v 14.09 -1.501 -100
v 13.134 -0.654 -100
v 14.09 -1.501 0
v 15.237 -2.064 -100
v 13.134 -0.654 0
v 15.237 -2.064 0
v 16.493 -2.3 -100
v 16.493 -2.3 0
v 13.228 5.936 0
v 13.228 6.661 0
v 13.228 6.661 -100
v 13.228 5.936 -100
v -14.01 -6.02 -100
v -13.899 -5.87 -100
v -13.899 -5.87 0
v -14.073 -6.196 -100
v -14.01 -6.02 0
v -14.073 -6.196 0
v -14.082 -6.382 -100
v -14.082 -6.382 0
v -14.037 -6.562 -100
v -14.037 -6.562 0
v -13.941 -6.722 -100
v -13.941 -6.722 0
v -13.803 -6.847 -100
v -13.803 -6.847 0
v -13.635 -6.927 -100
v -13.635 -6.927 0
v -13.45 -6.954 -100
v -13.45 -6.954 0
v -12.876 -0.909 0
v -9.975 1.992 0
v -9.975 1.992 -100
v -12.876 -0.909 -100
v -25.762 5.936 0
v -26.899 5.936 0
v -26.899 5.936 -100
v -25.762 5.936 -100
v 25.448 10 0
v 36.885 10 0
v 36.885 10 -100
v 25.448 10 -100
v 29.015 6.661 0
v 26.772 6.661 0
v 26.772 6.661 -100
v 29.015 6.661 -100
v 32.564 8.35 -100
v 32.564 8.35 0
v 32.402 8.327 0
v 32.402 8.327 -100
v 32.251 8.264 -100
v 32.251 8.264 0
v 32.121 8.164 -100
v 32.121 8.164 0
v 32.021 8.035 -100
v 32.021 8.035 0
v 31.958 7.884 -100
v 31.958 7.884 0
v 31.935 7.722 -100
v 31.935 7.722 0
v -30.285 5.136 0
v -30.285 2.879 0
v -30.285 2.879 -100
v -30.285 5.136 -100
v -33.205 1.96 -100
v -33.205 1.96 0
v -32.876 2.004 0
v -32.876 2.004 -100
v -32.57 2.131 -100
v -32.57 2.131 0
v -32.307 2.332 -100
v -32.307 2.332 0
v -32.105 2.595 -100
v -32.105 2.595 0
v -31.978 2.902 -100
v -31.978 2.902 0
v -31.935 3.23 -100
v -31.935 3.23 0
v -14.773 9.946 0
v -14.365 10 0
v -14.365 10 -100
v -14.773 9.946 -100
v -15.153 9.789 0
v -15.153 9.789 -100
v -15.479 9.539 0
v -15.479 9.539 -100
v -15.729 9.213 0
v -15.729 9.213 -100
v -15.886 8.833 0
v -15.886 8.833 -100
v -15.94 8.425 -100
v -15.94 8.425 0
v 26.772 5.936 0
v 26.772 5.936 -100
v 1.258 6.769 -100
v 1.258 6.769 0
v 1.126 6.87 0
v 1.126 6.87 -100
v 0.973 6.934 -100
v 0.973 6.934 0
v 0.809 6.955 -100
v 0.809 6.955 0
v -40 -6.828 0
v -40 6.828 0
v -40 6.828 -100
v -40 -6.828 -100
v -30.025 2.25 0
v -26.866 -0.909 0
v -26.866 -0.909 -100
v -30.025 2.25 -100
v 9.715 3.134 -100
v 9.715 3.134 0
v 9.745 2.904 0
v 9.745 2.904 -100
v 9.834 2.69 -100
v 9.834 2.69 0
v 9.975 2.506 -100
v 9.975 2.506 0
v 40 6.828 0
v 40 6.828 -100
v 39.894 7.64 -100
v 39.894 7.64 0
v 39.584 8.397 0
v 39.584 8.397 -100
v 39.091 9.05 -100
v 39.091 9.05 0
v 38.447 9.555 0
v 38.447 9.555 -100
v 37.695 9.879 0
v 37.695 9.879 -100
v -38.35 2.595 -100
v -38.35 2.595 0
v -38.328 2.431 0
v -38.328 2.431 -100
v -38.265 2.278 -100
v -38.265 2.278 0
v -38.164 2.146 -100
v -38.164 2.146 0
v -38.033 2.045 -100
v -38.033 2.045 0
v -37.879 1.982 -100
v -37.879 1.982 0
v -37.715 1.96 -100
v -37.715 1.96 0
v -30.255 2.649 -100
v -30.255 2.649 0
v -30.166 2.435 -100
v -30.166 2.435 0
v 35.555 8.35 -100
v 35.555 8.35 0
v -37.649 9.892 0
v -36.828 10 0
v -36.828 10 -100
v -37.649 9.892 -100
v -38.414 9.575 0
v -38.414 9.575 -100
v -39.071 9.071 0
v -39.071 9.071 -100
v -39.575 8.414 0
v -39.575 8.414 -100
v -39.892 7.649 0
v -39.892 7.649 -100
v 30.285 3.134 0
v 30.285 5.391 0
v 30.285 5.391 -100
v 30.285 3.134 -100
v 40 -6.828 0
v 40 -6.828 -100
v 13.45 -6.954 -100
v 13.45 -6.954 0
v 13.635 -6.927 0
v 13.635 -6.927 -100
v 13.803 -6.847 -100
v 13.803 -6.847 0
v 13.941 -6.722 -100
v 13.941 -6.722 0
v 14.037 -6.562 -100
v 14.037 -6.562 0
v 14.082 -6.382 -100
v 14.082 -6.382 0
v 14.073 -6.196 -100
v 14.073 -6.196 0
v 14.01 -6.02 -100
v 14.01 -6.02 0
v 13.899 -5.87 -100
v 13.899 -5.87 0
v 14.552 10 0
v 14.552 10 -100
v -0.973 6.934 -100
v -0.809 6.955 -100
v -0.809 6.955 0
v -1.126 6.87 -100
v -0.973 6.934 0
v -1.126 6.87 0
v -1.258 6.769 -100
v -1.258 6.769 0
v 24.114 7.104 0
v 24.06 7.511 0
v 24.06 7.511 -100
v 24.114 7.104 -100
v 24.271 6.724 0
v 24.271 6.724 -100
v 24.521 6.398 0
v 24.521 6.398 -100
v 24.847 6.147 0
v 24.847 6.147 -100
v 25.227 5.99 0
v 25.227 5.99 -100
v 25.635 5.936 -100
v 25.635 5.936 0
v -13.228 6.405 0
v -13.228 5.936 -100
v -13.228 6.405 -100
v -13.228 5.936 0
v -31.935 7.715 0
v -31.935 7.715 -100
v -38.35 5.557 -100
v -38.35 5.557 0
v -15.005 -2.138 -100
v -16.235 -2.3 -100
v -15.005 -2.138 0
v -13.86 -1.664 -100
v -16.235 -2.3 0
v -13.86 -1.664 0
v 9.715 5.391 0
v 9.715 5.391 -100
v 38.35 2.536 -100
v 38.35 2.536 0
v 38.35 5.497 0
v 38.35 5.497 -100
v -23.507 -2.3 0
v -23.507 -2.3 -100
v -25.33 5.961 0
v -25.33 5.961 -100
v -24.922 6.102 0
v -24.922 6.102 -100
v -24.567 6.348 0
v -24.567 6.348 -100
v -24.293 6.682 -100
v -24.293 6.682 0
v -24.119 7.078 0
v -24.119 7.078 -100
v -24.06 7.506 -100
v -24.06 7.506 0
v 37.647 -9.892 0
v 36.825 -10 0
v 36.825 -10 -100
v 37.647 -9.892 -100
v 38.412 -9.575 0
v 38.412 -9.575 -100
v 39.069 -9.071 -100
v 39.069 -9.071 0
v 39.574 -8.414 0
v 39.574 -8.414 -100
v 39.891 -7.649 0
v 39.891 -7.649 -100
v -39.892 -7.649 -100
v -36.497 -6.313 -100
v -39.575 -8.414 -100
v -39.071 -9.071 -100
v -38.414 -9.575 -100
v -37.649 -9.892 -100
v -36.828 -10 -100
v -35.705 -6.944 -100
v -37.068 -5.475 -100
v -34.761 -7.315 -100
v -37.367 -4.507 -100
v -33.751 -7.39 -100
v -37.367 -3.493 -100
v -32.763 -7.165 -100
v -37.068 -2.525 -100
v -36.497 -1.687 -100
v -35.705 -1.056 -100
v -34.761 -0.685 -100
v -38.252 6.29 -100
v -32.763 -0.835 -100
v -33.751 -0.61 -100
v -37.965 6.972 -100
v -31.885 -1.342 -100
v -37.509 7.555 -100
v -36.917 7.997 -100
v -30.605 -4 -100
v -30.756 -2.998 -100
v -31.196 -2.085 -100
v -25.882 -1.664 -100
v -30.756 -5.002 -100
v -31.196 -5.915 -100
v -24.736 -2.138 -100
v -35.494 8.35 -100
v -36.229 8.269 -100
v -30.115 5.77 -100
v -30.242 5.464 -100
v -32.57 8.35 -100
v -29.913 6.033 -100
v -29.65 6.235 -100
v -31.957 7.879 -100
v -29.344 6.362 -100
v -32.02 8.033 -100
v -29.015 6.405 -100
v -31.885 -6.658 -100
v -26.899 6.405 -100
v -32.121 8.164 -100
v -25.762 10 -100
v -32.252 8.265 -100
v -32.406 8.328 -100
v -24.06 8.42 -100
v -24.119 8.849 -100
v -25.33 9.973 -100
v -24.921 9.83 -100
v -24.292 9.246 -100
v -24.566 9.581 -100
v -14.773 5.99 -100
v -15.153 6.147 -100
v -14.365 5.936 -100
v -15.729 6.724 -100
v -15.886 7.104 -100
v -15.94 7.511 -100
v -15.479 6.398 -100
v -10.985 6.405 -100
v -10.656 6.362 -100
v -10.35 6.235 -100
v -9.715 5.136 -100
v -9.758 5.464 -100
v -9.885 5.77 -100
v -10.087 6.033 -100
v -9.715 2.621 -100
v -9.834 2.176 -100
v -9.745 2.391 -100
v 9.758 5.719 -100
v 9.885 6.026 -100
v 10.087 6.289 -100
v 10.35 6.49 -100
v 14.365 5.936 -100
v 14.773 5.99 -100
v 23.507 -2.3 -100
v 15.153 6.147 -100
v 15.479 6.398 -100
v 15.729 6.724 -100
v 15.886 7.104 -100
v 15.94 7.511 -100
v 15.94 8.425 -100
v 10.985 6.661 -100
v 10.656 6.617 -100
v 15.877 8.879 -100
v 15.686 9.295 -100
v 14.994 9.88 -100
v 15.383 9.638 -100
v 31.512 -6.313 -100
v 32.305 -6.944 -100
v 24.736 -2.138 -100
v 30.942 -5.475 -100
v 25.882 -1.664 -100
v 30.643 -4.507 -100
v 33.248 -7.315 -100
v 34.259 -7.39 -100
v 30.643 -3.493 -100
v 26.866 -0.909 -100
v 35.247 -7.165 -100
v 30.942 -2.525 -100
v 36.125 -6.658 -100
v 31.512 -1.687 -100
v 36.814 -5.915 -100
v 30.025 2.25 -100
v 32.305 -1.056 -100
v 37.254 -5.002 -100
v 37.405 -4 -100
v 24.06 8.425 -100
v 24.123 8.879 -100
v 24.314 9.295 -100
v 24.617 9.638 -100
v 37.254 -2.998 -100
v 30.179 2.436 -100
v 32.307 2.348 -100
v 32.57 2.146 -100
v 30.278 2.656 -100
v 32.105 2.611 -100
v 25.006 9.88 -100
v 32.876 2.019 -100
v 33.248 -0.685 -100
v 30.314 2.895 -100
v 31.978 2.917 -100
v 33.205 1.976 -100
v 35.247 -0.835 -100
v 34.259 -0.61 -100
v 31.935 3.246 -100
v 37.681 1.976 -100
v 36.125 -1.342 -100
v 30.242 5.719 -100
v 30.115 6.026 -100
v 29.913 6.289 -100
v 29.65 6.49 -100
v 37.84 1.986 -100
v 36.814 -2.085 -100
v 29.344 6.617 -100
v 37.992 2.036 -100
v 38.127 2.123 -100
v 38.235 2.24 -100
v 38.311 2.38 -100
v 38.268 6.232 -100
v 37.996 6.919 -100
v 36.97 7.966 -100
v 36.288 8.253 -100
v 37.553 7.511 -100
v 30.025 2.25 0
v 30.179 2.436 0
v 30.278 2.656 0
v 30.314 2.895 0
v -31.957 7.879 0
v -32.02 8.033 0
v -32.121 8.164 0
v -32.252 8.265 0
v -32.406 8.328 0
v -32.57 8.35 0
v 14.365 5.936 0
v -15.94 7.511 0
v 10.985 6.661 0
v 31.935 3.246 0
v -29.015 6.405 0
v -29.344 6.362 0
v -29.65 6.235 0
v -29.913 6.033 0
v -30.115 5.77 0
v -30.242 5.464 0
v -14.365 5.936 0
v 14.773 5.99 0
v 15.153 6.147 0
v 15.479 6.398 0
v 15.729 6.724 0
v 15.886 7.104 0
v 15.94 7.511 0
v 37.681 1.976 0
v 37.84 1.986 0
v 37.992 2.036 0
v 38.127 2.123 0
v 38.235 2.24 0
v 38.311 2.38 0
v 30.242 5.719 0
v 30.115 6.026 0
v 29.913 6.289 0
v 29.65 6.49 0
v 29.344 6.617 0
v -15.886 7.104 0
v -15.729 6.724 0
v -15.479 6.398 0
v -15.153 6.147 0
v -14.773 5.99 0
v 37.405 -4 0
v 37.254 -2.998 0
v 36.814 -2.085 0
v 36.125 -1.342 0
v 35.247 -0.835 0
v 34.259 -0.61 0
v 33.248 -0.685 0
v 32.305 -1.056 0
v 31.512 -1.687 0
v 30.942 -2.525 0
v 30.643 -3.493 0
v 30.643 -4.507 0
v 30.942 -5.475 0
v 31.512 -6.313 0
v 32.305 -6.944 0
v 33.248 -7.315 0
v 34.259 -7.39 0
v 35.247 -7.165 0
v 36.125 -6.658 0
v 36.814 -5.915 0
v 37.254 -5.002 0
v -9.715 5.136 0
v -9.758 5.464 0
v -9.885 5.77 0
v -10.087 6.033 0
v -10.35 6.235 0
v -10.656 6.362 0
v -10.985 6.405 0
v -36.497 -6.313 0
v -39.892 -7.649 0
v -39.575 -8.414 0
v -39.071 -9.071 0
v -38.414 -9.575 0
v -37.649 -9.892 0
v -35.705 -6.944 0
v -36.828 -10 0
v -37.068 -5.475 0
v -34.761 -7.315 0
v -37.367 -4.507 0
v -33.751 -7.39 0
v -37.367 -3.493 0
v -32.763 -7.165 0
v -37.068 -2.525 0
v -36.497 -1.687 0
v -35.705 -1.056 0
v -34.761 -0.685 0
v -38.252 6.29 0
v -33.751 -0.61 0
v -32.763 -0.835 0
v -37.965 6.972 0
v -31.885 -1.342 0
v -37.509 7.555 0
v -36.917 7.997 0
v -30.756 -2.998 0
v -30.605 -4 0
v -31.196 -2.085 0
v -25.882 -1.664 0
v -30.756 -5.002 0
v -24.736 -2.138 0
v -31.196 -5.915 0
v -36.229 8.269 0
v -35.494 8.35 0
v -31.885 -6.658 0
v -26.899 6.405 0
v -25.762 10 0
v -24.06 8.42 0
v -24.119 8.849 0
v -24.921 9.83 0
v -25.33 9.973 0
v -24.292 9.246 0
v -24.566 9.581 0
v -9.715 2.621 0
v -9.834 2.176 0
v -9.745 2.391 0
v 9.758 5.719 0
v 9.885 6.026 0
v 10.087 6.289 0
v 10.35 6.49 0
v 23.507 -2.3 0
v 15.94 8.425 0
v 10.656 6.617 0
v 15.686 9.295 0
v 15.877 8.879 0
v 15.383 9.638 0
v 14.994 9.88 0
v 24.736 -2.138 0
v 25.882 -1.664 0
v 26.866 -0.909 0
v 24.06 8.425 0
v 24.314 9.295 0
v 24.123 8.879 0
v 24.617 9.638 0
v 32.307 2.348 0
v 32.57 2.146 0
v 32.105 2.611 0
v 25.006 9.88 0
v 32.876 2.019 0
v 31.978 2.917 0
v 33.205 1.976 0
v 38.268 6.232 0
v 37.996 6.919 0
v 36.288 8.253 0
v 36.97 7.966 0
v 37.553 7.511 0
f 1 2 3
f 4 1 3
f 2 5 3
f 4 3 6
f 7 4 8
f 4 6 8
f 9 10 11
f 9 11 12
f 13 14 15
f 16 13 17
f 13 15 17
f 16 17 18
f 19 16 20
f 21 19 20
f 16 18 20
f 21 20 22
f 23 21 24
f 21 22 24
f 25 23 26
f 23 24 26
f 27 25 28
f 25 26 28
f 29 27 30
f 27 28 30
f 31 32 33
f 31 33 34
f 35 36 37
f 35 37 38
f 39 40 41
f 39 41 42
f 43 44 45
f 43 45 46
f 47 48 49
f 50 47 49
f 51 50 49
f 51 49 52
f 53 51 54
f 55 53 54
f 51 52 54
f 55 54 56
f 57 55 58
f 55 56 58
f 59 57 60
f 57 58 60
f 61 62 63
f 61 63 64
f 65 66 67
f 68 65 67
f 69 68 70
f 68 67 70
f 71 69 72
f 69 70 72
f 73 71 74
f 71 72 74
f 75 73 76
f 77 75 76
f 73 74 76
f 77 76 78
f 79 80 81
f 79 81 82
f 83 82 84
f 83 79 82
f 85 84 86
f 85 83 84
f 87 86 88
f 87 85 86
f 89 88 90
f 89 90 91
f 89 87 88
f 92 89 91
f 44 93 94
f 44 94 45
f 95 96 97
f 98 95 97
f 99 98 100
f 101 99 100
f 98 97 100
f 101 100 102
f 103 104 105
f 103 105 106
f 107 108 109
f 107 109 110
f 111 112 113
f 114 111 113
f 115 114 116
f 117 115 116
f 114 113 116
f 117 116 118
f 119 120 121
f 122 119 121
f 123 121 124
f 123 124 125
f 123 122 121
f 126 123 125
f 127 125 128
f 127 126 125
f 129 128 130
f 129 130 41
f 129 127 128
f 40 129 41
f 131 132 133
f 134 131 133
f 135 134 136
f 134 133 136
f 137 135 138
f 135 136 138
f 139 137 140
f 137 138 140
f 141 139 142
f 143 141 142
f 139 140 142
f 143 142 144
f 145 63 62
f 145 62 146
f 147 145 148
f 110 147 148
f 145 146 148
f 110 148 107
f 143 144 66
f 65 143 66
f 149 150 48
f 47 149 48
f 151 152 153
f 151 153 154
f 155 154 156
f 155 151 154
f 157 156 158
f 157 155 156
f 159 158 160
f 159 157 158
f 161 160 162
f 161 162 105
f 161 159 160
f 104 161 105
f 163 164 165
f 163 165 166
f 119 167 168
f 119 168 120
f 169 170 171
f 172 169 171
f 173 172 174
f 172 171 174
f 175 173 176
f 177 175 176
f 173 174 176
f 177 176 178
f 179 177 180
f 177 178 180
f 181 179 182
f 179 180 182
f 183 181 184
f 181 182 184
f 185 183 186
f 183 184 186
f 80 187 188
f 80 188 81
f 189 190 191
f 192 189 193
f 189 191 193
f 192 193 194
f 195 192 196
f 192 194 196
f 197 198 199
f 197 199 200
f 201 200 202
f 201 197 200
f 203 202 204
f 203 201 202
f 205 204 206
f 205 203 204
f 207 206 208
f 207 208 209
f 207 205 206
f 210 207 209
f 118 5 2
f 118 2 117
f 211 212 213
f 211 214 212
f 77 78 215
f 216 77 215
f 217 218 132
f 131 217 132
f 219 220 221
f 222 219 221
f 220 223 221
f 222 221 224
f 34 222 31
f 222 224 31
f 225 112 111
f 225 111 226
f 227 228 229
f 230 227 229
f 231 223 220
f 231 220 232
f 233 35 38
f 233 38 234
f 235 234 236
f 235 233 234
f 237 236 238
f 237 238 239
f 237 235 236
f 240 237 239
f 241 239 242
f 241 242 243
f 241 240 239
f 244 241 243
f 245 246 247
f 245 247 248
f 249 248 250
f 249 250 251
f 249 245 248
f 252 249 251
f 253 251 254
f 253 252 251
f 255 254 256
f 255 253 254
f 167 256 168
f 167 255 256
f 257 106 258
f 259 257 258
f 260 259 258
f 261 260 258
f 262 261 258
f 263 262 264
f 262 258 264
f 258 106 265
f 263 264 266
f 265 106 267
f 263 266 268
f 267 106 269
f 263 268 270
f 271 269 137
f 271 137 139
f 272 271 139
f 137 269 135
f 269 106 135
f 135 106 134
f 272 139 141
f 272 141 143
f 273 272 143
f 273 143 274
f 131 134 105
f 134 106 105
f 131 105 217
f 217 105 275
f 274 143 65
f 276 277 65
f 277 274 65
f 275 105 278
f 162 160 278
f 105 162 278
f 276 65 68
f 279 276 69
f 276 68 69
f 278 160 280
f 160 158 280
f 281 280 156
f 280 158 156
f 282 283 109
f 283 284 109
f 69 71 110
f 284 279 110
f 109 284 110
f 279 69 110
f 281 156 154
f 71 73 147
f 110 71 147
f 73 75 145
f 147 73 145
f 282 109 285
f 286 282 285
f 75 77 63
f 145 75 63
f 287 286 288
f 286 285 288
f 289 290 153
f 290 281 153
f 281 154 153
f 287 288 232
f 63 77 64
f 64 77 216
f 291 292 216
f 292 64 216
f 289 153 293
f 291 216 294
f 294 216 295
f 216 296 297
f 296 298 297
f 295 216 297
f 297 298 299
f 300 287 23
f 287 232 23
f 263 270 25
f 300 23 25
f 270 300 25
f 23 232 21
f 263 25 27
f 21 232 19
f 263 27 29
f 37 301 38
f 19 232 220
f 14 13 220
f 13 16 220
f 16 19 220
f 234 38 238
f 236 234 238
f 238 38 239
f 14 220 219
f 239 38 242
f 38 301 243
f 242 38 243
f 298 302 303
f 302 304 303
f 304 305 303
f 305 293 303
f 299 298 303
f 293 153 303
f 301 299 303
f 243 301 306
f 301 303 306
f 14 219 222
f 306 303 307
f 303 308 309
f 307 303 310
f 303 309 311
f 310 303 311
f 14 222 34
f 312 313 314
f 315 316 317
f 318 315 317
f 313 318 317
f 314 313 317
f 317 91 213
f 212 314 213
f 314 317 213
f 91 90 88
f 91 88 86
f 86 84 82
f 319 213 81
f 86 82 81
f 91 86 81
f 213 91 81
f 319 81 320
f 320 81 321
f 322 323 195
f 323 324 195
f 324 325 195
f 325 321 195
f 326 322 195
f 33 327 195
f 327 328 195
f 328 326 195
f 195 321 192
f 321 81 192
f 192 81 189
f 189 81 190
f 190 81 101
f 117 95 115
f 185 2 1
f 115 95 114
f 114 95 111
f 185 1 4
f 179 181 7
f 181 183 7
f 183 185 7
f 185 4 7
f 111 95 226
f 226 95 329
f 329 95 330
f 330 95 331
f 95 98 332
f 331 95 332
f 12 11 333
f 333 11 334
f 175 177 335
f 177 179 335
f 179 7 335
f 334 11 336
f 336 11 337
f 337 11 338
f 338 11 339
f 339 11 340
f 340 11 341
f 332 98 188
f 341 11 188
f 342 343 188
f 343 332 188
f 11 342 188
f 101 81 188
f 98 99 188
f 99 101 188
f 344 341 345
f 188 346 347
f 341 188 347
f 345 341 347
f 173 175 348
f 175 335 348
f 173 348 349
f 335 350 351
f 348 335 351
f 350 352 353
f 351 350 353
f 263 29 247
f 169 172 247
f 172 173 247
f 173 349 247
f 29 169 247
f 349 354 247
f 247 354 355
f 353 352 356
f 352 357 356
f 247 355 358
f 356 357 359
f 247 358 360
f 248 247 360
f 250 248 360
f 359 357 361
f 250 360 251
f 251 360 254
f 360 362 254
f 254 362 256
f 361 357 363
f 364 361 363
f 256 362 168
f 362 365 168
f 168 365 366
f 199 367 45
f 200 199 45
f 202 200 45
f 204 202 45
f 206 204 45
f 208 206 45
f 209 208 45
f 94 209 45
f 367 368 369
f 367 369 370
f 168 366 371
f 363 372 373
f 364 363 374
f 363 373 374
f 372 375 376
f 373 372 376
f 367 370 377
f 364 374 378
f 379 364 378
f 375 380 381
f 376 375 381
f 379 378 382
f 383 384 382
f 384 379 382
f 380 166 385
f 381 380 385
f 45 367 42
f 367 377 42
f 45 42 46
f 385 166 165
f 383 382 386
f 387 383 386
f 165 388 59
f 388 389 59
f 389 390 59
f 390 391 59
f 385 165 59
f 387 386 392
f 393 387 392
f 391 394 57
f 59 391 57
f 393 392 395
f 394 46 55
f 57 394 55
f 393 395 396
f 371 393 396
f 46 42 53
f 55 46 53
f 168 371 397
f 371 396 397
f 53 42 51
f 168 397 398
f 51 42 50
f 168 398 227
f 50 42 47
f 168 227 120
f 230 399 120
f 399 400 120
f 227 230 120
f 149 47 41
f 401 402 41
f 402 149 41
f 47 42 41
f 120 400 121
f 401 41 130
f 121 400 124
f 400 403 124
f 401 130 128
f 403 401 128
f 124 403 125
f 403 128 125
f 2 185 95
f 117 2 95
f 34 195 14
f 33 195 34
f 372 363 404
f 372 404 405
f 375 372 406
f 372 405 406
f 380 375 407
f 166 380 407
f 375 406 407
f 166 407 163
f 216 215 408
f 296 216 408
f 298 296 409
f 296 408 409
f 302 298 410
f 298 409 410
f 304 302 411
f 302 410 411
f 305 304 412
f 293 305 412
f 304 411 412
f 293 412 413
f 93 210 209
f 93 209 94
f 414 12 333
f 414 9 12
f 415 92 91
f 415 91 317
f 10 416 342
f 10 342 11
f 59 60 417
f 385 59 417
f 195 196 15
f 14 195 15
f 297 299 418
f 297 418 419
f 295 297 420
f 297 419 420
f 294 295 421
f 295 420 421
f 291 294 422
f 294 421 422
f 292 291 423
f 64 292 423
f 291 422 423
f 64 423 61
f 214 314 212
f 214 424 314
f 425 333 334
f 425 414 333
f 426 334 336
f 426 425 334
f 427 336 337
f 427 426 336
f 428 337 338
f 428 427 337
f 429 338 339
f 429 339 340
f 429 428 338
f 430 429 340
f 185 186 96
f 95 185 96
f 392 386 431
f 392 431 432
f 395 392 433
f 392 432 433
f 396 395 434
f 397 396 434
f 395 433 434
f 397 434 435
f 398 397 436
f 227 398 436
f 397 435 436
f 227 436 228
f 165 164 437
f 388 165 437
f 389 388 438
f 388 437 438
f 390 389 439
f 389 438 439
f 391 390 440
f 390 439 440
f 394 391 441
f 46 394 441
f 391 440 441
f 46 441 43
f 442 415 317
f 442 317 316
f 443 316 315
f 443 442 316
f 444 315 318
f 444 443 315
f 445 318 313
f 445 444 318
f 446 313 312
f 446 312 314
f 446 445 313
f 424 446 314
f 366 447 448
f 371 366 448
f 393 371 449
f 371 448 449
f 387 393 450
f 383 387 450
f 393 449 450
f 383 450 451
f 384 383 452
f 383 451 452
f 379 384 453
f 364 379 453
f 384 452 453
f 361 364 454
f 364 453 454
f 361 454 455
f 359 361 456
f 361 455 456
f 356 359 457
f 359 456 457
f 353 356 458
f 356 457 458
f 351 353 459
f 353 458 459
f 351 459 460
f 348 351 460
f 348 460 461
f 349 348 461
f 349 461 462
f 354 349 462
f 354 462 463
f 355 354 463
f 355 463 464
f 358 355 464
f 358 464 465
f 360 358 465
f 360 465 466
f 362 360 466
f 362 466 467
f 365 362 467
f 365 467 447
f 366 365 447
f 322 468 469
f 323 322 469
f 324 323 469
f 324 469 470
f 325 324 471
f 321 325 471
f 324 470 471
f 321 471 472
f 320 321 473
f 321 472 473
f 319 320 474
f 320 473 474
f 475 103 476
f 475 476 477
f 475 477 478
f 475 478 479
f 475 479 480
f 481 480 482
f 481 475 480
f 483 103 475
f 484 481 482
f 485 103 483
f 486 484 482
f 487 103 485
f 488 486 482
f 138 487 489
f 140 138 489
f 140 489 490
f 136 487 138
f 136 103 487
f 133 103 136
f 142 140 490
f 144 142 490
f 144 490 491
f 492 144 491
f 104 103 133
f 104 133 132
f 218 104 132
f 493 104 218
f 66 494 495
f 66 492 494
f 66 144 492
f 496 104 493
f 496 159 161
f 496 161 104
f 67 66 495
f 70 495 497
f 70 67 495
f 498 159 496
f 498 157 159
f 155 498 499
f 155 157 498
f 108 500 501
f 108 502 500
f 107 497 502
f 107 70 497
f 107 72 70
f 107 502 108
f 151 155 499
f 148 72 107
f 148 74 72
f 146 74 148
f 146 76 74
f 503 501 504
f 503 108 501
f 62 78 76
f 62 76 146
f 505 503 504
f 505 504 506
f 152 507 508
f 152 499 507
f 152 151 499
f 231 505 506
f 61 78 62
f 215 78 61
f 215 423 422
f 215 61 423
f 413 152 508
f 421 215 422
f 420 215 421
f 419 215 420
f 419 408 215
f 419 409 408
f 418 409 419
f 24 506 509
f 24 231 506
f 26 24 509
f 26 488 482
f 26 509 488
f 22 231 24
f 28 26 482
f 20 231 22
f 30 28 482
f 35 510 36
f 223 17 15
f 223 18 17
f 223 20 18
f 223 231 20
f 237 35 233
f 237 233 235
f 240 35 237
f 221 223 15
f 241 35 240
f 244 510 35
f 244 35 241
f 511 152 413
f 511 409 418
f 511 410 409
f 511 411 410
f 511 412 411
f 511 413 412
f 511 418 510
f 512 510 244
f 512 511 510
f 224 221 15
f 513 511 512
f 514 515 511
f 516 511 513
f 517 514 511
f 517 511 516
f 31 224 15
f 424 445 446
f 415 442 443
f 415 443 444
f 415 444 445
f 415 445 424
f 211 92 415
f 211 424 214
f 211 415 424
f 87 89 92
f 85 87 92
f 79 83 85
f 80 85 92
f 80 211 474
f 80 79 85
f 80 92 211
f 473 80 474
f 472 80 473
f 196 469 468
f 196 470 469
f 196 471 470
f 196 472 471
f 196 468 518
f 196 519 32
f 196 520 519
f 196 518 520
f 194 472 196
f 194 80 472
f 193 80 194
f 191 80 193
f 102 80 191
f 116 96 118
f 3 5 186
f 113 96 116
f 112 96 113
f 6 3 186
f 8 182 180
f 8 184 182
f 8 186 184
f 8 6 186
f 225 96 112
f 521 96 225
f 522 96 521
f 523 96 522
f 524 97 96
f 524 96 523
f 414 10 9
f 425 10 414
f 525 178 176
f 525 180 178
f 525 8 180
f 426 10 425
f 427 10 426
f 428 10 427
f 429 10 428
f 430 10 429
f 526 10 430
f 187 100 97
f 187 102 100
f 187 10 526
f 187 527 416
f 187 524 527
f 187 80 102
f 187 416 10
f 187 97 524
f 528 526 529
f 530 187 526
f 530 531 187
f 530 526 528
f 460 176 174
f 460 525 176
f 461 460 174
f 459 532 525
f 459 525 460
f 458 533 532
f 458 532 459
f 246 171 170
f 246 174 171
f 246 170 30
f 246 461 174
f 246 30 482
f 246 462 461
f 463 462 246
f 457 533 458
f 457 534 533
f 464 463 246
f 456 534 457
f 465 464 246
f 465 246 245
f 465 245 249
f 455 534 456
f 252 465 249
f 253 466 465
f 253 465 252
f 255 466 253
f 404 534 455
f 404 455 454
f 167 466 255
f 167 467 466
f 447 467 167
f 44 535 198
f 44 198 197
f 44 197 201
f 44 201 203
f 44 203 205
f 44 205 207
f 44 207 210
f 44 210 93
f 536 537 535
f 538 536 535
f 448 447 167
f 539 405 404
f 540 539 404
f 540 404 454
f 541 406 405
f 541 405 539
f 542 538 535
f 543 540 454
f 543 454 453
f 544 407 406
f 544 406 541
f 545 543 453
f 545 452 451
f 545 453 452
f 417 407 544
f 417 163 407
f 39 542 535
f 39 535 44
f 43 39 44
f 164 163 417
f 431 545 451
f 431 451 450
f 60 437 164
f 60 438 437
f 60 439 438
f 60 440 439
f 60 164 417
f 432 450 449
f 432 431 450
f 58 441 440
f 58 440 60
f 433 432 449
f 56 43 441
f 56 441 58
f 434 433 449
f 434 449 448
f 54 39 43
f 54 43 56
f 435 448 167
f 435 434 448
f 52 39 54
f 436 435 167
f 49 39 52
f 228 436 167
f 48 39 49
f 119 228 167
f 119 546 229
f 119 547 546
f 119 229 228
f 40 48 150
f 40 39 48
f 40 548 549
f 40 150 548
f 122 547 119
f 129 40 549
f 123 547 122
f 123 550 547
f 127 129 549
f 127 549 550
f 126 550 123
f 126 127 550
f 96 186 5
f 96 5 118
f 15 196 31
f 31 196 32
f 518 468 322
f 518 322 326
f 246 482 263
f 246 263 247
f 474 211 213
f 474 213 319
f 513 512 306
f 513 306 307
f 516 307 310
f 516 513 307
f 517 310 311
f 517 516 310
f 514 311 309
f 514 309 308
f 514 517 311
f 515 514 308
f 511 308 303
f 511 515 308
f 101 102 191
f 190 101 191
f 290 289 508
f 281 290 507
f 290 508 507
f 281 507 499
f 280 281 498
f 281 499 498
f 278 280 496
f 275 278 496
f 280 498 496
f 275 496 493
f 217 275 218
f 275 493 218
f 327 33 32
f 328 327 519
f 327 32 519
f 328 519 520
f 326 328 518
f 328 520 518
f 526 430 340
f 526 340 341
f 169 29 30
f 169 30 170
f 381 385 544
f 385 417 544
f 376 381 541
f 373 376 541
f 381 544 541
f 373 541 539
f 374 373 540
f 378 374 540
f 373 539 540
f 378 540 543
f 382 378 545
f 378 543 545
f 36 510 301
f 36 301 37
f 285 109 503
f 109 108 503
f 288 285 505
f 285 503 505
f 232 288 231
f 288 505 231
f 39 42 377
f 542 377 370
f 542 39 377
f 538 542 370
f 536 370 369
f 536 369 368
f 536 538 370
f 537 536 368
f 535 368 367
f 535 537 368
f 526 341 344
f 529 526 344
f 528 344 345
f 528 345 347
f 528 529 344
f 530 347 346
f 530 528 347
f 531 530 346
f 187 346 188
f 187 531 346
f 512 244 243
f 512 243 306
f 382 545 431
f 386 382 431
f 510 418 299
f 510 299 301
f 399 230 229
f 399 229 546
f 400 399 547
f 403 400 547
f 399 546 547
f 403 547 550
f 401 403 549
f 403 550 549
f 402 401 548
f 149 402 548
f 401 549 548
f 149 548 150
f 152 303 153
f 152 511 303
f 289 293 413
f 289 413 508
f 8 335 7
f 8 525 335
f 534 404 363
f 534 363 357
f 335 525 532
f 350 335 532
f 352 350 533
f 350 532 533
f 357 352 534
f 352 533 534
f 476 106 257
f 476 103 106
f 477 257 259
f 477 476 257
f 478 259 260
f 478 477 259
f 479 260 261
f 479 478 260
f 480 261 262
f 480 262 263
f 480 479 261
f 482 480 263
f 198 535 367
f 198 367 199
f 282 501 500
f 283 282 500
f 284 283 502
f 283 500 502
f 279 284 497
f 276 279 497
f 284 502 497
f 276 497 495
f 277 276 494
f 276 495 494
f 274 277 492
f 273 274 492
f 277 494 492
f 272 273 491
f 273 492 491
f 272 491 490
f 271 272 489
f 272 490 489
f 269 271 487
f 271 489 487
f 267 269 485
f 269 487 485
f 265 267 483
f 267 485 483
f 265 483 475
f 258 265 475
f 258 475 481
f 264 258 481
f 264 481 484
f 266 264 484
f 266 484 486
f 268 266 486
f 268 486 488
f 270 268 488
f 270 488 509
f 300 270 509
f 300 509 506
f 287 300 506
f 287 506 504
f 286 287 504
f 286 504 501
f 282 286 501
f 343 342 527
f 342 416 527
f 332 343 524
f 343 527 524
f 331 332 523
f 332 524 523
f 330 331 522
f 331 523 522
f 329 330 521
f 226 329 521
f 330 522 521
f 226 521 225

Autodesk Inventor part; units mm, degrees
ref_plane "YZ Plane" through (0, 0, 0) normal (1, 0, 0) x (0, 1, 0)
ref_plane "XZ Plane" through (0, 0, 0) normal (0, 1, 0) x (-1, 0, 0)
ref_plane "XY Plane" through (0, 0, 0) normal (0, 0, 1) x (1, 0, 0)
sketch "Sketch1" plane through (0, 0, 0) normal (0, 0, 1) x (1, 0, 0)
  circle A0 centre (34.0048, -4) radius 3.4
  line L0 (31.935, 7.7219) -> (31.935, 3.2459)
  arc A1 (32.564, 8.35) -> (31.935, 7.7219) centre (32.5699, 7.7151) ccw
  line L1 (35.5549, 8.35) -> (32.564, 8.35)
  arc A2 (38.35, 5.4968) -> (35.5549, 8.35) centre (35.557, 5.5563) ccw
  line L2 (38.35, 2.5356) -> (38.35, 5.4968)
  arc A3 (37.6808, 1.976) -> (38.35, 2.5356) centre (37.7194, 2.6098) ccw
  line L3 (33.2048, 1.976) -> (37.6808, 1.976)
  arc A4 (31.935, 3.2459) -> (33.2048, 1.976) centre (33.2048, 3.2459) ccw
  line L4 (-13.4502, -6.9544) -> (13.4502, -6.9544)
  arc A5 (-13.8991, -5.8705) -> (-13.4502, -6.9544) centre (-13.4502, -6.3195) ccw
  line L5 (-1.2578, 6.7693) -> (-13.8991, -5.8705)
  arc A6 (-0.8088, 6.9553) -> (-1.2578, 6.7693) centre (-0.8088, 6.3203) ccw
  line L6 (0.8088, 6.9553) -> (-0.8088, 6.9553)
  arc A7 (1.2578, 6.7693) -> (0.8088, 6.9553) centre (0.8088, 6.3203) ccw
  line L7 (13.8991, -5.8705) -> (1.2578, 6.7693)
  arc A8 (13.4502, -6.9544) -> (13.8991, -5.8705) centre (13.4502, -6.3195) ccw
  line L8 (-37.7151, 1.9604) -> (-33.2048, 1.9604)
  arc A9 (-38.35, 2.5953) -> (-37.7151, 1.9604) centre (-37.7151, 2.5953) ccw
  line L9 (-38.35, 5.5571) -> (-38.35, 2.5953)
  arc A10 (-35.4935, 8.35) -> (-38.35, 5.5571) centre (-35.5563, 5.5571) ccw
  line L10 (-32.5699, 8.35) -> (-35.4935, 8.35)
  arc A11 (-31.935, 7.7151) -> (-32.5699, 8.35) centre (-32.5699, 7.7151) ccw
  line L11 (-31.935, 3.2302) -> (-31.935, 7.7151)
  arc A12 (-33.2048, 1.9604) -> (-31.935, 3.2302) centre (-33.2048, 3.2302) ccw
  circle A13 centre (-34.0048, -4) radius 3.4
  line L12 (13.2285, 5.9365) -> (14.3654, 5.9365)
  arc A14 (14.3654, 5.9365) -> (15.94, 7.5111) centre (14.3654, 7.5111) ccw
  line L13 (15.94, 7.5111) -> (15.94, 8.4254)
  arc A15 (15.94, 8.4254) -> (14.5525, 10) centre (14.3654, 8.4365) ccw
  line L14 (14.5525, 10) -> (-14.3654, 10)
  arc A16 (-14.3654, 10) -> (-15.94, 8.4254) centre (-14.3654, 8.4254) ccw
  line L15 (-15.94, 8.4254) -> (-15.94, 7.5111)
  arc A17 (-15.94, 7.5111) -> (-14.3654, 5.9365) centre (-14.3654, 7.5111) ccw
  line L16 (-14.3654, 5.9365) -> (-13.2285, 5.9365)
  line L17 (-13.2285, 5.9365) -> (-13.2285, 6.4054)
  line L18 (-13.2285, 6.4054) -> (-10.9848, 6.4054)
  arc A18 (-9.715, 5.1355) -> (-10.9848, 6.4054) centre (-10.9848, 5.1355) ccw
  line L19 (-9.715, 5.1355) -> (-9.715, 2.6208)
  arc A19 (-9.9753, 1.9923) -> (-9.715, 2.6208) centre (-10.6039, 2.6208) ccw
  line L20 (-9.9753, 1.9923) -> (-12.8764, -0.9089)
  arc A20 (-16.2347, -2.3) -> (-12.8764, -0.9089) centre (-16.2347, 2.4492) ccw
  line L21 (-16.2347, -2.3) -> (-23.5072, -2.3)
  arc A21 (-26.8655, -0.9089) -> (-23.5072, -2.3) centre (-23.5072, 2.4492) ccw
  line L22 (-26.8655, -0.9089) -> (-30.0247, 2.2504)
  arc A22 (-30.285, 2.879) -> (-30.0247, 2.2504) centre (-29.3961, 2.879) ccw
  line L23 (-30.285, 2.879) -> (-30.285, 5.1355)
  arc A23 (-29.0152, 6.4054) -> (-30.285, 5.1355) centre (-29.0152, 5.1355) ccw
  line L24 (-29.0152, 6.4054) -> (-26.8986, 6.4054)
  line L25 (-26.8986, 6.4054) -> (-26.8986, 5.9365)
  line L26 (-26.8986, 5.9365) -> (-25.7617, 5.9365)
  arc A24 (-25.7617, 5.9365) -> (-24.06, 7.506) centre (-25.6346, 7.506) ccw
  line L27 (-24.06, 7.506) -> (-24.06, 8.4203)
  arc A25 (-24.06, 8.4203) -> (-25.7617, 10) centre (-25.6441, 8.4203) ccw
  line L28 (-25.7617, 10) -> (-36.8282, 10)
  arc A26 (-36.8282, 10) -> (-40, 6.8282) centre (-36.8282, 6.8282) ccw
  line L29 (-40, 6.8282) -> (-40, -6.8282)
  arc A27 (-40, -6.8282) -> (-36.8282, -10) centre (-36.8282, -6.8282) ccw
  line L30 (-36.8282, -10) -> (36.8254, -10)
  arc A28 (36.8254, -10) -> (40, -6.8282) centre (36.8254, -6.8254) ccw
  line L31 (40, -6.8282) -> (40, 6.8282)
  arc A29 (40, 6.8282) -> (36.8854, 10) centre (36.8254, 6.826) ccw
  line L32 (36.8854, 10) -> (25.4475, 10)
  arc A30 (25.4475, 10) -> (24.06, 8.4254) centre (25.6346, 8.4365) ccw
  line L33 (24.06, 8.4254) -> (24.06, 7.5111)
  arc A31 (24.06, 7.5111) -> (25.6346, 5.9365) centre (25.6346, 7.5111) ccw
  line L34 (25.6346, 5.9365) -> (26.7715, 5.9365)
  line L35 (26.7715, 5.9365) -> (26.7715, 6.6606)
  line L36 (26.7715, 6.6606) -> (29.0152, 6.6606)
  arc A32 (30.285, 5.3908) -> (29.0152, 6.6606) centre (29.0152, 5.3908) ccw
  line L37 (30.285, 5.3908) -> (30.285, 3.1342)
  arc A33 (30.0247, 2.2504) -> (30.285, 3.1342) centre (29.4256, 2.9071) ccw
  line L38 (30.0247, 2.2504) -> (26.8655, -0.9089)
  arc A34 (23.5072, -2.3) -> (26.8655, -0.9089) centre (23.5072, 2.4492) ccw
  line L39 (23.5072, -2.3) -> (16.4928, -2.3)
  arc A35 (13.1345, -0.6536) -> (16.4928, -2.3) centre (16.7353, 2.443) ccw
  line L40 (13.1345, -0.6536) -> (9.9753, 2.5057)
  arc A36 (9.715, 3.1342) -> (9.9753, 2.5057) centre (10.6039, 3.1342) ccw
  line L41 (9.715, 3.1342) -> (9.715, 5.3908)
  arc A37 (10.9848, 6.6606) -> (9.715, 5.3908) centre (10.9848, 5.3908) ccw
  line L42 (10.9848, 6.6606) -> (13.2285, 6.6606)
  line L43 (13.2285, 6.6606) -> (13.2285, 5.9365)
  point P0 (0, 0)
extrude "Extrusion1" add sketch "Sketch1" against normal blind 100
properties part number "40-8020.dxf"
